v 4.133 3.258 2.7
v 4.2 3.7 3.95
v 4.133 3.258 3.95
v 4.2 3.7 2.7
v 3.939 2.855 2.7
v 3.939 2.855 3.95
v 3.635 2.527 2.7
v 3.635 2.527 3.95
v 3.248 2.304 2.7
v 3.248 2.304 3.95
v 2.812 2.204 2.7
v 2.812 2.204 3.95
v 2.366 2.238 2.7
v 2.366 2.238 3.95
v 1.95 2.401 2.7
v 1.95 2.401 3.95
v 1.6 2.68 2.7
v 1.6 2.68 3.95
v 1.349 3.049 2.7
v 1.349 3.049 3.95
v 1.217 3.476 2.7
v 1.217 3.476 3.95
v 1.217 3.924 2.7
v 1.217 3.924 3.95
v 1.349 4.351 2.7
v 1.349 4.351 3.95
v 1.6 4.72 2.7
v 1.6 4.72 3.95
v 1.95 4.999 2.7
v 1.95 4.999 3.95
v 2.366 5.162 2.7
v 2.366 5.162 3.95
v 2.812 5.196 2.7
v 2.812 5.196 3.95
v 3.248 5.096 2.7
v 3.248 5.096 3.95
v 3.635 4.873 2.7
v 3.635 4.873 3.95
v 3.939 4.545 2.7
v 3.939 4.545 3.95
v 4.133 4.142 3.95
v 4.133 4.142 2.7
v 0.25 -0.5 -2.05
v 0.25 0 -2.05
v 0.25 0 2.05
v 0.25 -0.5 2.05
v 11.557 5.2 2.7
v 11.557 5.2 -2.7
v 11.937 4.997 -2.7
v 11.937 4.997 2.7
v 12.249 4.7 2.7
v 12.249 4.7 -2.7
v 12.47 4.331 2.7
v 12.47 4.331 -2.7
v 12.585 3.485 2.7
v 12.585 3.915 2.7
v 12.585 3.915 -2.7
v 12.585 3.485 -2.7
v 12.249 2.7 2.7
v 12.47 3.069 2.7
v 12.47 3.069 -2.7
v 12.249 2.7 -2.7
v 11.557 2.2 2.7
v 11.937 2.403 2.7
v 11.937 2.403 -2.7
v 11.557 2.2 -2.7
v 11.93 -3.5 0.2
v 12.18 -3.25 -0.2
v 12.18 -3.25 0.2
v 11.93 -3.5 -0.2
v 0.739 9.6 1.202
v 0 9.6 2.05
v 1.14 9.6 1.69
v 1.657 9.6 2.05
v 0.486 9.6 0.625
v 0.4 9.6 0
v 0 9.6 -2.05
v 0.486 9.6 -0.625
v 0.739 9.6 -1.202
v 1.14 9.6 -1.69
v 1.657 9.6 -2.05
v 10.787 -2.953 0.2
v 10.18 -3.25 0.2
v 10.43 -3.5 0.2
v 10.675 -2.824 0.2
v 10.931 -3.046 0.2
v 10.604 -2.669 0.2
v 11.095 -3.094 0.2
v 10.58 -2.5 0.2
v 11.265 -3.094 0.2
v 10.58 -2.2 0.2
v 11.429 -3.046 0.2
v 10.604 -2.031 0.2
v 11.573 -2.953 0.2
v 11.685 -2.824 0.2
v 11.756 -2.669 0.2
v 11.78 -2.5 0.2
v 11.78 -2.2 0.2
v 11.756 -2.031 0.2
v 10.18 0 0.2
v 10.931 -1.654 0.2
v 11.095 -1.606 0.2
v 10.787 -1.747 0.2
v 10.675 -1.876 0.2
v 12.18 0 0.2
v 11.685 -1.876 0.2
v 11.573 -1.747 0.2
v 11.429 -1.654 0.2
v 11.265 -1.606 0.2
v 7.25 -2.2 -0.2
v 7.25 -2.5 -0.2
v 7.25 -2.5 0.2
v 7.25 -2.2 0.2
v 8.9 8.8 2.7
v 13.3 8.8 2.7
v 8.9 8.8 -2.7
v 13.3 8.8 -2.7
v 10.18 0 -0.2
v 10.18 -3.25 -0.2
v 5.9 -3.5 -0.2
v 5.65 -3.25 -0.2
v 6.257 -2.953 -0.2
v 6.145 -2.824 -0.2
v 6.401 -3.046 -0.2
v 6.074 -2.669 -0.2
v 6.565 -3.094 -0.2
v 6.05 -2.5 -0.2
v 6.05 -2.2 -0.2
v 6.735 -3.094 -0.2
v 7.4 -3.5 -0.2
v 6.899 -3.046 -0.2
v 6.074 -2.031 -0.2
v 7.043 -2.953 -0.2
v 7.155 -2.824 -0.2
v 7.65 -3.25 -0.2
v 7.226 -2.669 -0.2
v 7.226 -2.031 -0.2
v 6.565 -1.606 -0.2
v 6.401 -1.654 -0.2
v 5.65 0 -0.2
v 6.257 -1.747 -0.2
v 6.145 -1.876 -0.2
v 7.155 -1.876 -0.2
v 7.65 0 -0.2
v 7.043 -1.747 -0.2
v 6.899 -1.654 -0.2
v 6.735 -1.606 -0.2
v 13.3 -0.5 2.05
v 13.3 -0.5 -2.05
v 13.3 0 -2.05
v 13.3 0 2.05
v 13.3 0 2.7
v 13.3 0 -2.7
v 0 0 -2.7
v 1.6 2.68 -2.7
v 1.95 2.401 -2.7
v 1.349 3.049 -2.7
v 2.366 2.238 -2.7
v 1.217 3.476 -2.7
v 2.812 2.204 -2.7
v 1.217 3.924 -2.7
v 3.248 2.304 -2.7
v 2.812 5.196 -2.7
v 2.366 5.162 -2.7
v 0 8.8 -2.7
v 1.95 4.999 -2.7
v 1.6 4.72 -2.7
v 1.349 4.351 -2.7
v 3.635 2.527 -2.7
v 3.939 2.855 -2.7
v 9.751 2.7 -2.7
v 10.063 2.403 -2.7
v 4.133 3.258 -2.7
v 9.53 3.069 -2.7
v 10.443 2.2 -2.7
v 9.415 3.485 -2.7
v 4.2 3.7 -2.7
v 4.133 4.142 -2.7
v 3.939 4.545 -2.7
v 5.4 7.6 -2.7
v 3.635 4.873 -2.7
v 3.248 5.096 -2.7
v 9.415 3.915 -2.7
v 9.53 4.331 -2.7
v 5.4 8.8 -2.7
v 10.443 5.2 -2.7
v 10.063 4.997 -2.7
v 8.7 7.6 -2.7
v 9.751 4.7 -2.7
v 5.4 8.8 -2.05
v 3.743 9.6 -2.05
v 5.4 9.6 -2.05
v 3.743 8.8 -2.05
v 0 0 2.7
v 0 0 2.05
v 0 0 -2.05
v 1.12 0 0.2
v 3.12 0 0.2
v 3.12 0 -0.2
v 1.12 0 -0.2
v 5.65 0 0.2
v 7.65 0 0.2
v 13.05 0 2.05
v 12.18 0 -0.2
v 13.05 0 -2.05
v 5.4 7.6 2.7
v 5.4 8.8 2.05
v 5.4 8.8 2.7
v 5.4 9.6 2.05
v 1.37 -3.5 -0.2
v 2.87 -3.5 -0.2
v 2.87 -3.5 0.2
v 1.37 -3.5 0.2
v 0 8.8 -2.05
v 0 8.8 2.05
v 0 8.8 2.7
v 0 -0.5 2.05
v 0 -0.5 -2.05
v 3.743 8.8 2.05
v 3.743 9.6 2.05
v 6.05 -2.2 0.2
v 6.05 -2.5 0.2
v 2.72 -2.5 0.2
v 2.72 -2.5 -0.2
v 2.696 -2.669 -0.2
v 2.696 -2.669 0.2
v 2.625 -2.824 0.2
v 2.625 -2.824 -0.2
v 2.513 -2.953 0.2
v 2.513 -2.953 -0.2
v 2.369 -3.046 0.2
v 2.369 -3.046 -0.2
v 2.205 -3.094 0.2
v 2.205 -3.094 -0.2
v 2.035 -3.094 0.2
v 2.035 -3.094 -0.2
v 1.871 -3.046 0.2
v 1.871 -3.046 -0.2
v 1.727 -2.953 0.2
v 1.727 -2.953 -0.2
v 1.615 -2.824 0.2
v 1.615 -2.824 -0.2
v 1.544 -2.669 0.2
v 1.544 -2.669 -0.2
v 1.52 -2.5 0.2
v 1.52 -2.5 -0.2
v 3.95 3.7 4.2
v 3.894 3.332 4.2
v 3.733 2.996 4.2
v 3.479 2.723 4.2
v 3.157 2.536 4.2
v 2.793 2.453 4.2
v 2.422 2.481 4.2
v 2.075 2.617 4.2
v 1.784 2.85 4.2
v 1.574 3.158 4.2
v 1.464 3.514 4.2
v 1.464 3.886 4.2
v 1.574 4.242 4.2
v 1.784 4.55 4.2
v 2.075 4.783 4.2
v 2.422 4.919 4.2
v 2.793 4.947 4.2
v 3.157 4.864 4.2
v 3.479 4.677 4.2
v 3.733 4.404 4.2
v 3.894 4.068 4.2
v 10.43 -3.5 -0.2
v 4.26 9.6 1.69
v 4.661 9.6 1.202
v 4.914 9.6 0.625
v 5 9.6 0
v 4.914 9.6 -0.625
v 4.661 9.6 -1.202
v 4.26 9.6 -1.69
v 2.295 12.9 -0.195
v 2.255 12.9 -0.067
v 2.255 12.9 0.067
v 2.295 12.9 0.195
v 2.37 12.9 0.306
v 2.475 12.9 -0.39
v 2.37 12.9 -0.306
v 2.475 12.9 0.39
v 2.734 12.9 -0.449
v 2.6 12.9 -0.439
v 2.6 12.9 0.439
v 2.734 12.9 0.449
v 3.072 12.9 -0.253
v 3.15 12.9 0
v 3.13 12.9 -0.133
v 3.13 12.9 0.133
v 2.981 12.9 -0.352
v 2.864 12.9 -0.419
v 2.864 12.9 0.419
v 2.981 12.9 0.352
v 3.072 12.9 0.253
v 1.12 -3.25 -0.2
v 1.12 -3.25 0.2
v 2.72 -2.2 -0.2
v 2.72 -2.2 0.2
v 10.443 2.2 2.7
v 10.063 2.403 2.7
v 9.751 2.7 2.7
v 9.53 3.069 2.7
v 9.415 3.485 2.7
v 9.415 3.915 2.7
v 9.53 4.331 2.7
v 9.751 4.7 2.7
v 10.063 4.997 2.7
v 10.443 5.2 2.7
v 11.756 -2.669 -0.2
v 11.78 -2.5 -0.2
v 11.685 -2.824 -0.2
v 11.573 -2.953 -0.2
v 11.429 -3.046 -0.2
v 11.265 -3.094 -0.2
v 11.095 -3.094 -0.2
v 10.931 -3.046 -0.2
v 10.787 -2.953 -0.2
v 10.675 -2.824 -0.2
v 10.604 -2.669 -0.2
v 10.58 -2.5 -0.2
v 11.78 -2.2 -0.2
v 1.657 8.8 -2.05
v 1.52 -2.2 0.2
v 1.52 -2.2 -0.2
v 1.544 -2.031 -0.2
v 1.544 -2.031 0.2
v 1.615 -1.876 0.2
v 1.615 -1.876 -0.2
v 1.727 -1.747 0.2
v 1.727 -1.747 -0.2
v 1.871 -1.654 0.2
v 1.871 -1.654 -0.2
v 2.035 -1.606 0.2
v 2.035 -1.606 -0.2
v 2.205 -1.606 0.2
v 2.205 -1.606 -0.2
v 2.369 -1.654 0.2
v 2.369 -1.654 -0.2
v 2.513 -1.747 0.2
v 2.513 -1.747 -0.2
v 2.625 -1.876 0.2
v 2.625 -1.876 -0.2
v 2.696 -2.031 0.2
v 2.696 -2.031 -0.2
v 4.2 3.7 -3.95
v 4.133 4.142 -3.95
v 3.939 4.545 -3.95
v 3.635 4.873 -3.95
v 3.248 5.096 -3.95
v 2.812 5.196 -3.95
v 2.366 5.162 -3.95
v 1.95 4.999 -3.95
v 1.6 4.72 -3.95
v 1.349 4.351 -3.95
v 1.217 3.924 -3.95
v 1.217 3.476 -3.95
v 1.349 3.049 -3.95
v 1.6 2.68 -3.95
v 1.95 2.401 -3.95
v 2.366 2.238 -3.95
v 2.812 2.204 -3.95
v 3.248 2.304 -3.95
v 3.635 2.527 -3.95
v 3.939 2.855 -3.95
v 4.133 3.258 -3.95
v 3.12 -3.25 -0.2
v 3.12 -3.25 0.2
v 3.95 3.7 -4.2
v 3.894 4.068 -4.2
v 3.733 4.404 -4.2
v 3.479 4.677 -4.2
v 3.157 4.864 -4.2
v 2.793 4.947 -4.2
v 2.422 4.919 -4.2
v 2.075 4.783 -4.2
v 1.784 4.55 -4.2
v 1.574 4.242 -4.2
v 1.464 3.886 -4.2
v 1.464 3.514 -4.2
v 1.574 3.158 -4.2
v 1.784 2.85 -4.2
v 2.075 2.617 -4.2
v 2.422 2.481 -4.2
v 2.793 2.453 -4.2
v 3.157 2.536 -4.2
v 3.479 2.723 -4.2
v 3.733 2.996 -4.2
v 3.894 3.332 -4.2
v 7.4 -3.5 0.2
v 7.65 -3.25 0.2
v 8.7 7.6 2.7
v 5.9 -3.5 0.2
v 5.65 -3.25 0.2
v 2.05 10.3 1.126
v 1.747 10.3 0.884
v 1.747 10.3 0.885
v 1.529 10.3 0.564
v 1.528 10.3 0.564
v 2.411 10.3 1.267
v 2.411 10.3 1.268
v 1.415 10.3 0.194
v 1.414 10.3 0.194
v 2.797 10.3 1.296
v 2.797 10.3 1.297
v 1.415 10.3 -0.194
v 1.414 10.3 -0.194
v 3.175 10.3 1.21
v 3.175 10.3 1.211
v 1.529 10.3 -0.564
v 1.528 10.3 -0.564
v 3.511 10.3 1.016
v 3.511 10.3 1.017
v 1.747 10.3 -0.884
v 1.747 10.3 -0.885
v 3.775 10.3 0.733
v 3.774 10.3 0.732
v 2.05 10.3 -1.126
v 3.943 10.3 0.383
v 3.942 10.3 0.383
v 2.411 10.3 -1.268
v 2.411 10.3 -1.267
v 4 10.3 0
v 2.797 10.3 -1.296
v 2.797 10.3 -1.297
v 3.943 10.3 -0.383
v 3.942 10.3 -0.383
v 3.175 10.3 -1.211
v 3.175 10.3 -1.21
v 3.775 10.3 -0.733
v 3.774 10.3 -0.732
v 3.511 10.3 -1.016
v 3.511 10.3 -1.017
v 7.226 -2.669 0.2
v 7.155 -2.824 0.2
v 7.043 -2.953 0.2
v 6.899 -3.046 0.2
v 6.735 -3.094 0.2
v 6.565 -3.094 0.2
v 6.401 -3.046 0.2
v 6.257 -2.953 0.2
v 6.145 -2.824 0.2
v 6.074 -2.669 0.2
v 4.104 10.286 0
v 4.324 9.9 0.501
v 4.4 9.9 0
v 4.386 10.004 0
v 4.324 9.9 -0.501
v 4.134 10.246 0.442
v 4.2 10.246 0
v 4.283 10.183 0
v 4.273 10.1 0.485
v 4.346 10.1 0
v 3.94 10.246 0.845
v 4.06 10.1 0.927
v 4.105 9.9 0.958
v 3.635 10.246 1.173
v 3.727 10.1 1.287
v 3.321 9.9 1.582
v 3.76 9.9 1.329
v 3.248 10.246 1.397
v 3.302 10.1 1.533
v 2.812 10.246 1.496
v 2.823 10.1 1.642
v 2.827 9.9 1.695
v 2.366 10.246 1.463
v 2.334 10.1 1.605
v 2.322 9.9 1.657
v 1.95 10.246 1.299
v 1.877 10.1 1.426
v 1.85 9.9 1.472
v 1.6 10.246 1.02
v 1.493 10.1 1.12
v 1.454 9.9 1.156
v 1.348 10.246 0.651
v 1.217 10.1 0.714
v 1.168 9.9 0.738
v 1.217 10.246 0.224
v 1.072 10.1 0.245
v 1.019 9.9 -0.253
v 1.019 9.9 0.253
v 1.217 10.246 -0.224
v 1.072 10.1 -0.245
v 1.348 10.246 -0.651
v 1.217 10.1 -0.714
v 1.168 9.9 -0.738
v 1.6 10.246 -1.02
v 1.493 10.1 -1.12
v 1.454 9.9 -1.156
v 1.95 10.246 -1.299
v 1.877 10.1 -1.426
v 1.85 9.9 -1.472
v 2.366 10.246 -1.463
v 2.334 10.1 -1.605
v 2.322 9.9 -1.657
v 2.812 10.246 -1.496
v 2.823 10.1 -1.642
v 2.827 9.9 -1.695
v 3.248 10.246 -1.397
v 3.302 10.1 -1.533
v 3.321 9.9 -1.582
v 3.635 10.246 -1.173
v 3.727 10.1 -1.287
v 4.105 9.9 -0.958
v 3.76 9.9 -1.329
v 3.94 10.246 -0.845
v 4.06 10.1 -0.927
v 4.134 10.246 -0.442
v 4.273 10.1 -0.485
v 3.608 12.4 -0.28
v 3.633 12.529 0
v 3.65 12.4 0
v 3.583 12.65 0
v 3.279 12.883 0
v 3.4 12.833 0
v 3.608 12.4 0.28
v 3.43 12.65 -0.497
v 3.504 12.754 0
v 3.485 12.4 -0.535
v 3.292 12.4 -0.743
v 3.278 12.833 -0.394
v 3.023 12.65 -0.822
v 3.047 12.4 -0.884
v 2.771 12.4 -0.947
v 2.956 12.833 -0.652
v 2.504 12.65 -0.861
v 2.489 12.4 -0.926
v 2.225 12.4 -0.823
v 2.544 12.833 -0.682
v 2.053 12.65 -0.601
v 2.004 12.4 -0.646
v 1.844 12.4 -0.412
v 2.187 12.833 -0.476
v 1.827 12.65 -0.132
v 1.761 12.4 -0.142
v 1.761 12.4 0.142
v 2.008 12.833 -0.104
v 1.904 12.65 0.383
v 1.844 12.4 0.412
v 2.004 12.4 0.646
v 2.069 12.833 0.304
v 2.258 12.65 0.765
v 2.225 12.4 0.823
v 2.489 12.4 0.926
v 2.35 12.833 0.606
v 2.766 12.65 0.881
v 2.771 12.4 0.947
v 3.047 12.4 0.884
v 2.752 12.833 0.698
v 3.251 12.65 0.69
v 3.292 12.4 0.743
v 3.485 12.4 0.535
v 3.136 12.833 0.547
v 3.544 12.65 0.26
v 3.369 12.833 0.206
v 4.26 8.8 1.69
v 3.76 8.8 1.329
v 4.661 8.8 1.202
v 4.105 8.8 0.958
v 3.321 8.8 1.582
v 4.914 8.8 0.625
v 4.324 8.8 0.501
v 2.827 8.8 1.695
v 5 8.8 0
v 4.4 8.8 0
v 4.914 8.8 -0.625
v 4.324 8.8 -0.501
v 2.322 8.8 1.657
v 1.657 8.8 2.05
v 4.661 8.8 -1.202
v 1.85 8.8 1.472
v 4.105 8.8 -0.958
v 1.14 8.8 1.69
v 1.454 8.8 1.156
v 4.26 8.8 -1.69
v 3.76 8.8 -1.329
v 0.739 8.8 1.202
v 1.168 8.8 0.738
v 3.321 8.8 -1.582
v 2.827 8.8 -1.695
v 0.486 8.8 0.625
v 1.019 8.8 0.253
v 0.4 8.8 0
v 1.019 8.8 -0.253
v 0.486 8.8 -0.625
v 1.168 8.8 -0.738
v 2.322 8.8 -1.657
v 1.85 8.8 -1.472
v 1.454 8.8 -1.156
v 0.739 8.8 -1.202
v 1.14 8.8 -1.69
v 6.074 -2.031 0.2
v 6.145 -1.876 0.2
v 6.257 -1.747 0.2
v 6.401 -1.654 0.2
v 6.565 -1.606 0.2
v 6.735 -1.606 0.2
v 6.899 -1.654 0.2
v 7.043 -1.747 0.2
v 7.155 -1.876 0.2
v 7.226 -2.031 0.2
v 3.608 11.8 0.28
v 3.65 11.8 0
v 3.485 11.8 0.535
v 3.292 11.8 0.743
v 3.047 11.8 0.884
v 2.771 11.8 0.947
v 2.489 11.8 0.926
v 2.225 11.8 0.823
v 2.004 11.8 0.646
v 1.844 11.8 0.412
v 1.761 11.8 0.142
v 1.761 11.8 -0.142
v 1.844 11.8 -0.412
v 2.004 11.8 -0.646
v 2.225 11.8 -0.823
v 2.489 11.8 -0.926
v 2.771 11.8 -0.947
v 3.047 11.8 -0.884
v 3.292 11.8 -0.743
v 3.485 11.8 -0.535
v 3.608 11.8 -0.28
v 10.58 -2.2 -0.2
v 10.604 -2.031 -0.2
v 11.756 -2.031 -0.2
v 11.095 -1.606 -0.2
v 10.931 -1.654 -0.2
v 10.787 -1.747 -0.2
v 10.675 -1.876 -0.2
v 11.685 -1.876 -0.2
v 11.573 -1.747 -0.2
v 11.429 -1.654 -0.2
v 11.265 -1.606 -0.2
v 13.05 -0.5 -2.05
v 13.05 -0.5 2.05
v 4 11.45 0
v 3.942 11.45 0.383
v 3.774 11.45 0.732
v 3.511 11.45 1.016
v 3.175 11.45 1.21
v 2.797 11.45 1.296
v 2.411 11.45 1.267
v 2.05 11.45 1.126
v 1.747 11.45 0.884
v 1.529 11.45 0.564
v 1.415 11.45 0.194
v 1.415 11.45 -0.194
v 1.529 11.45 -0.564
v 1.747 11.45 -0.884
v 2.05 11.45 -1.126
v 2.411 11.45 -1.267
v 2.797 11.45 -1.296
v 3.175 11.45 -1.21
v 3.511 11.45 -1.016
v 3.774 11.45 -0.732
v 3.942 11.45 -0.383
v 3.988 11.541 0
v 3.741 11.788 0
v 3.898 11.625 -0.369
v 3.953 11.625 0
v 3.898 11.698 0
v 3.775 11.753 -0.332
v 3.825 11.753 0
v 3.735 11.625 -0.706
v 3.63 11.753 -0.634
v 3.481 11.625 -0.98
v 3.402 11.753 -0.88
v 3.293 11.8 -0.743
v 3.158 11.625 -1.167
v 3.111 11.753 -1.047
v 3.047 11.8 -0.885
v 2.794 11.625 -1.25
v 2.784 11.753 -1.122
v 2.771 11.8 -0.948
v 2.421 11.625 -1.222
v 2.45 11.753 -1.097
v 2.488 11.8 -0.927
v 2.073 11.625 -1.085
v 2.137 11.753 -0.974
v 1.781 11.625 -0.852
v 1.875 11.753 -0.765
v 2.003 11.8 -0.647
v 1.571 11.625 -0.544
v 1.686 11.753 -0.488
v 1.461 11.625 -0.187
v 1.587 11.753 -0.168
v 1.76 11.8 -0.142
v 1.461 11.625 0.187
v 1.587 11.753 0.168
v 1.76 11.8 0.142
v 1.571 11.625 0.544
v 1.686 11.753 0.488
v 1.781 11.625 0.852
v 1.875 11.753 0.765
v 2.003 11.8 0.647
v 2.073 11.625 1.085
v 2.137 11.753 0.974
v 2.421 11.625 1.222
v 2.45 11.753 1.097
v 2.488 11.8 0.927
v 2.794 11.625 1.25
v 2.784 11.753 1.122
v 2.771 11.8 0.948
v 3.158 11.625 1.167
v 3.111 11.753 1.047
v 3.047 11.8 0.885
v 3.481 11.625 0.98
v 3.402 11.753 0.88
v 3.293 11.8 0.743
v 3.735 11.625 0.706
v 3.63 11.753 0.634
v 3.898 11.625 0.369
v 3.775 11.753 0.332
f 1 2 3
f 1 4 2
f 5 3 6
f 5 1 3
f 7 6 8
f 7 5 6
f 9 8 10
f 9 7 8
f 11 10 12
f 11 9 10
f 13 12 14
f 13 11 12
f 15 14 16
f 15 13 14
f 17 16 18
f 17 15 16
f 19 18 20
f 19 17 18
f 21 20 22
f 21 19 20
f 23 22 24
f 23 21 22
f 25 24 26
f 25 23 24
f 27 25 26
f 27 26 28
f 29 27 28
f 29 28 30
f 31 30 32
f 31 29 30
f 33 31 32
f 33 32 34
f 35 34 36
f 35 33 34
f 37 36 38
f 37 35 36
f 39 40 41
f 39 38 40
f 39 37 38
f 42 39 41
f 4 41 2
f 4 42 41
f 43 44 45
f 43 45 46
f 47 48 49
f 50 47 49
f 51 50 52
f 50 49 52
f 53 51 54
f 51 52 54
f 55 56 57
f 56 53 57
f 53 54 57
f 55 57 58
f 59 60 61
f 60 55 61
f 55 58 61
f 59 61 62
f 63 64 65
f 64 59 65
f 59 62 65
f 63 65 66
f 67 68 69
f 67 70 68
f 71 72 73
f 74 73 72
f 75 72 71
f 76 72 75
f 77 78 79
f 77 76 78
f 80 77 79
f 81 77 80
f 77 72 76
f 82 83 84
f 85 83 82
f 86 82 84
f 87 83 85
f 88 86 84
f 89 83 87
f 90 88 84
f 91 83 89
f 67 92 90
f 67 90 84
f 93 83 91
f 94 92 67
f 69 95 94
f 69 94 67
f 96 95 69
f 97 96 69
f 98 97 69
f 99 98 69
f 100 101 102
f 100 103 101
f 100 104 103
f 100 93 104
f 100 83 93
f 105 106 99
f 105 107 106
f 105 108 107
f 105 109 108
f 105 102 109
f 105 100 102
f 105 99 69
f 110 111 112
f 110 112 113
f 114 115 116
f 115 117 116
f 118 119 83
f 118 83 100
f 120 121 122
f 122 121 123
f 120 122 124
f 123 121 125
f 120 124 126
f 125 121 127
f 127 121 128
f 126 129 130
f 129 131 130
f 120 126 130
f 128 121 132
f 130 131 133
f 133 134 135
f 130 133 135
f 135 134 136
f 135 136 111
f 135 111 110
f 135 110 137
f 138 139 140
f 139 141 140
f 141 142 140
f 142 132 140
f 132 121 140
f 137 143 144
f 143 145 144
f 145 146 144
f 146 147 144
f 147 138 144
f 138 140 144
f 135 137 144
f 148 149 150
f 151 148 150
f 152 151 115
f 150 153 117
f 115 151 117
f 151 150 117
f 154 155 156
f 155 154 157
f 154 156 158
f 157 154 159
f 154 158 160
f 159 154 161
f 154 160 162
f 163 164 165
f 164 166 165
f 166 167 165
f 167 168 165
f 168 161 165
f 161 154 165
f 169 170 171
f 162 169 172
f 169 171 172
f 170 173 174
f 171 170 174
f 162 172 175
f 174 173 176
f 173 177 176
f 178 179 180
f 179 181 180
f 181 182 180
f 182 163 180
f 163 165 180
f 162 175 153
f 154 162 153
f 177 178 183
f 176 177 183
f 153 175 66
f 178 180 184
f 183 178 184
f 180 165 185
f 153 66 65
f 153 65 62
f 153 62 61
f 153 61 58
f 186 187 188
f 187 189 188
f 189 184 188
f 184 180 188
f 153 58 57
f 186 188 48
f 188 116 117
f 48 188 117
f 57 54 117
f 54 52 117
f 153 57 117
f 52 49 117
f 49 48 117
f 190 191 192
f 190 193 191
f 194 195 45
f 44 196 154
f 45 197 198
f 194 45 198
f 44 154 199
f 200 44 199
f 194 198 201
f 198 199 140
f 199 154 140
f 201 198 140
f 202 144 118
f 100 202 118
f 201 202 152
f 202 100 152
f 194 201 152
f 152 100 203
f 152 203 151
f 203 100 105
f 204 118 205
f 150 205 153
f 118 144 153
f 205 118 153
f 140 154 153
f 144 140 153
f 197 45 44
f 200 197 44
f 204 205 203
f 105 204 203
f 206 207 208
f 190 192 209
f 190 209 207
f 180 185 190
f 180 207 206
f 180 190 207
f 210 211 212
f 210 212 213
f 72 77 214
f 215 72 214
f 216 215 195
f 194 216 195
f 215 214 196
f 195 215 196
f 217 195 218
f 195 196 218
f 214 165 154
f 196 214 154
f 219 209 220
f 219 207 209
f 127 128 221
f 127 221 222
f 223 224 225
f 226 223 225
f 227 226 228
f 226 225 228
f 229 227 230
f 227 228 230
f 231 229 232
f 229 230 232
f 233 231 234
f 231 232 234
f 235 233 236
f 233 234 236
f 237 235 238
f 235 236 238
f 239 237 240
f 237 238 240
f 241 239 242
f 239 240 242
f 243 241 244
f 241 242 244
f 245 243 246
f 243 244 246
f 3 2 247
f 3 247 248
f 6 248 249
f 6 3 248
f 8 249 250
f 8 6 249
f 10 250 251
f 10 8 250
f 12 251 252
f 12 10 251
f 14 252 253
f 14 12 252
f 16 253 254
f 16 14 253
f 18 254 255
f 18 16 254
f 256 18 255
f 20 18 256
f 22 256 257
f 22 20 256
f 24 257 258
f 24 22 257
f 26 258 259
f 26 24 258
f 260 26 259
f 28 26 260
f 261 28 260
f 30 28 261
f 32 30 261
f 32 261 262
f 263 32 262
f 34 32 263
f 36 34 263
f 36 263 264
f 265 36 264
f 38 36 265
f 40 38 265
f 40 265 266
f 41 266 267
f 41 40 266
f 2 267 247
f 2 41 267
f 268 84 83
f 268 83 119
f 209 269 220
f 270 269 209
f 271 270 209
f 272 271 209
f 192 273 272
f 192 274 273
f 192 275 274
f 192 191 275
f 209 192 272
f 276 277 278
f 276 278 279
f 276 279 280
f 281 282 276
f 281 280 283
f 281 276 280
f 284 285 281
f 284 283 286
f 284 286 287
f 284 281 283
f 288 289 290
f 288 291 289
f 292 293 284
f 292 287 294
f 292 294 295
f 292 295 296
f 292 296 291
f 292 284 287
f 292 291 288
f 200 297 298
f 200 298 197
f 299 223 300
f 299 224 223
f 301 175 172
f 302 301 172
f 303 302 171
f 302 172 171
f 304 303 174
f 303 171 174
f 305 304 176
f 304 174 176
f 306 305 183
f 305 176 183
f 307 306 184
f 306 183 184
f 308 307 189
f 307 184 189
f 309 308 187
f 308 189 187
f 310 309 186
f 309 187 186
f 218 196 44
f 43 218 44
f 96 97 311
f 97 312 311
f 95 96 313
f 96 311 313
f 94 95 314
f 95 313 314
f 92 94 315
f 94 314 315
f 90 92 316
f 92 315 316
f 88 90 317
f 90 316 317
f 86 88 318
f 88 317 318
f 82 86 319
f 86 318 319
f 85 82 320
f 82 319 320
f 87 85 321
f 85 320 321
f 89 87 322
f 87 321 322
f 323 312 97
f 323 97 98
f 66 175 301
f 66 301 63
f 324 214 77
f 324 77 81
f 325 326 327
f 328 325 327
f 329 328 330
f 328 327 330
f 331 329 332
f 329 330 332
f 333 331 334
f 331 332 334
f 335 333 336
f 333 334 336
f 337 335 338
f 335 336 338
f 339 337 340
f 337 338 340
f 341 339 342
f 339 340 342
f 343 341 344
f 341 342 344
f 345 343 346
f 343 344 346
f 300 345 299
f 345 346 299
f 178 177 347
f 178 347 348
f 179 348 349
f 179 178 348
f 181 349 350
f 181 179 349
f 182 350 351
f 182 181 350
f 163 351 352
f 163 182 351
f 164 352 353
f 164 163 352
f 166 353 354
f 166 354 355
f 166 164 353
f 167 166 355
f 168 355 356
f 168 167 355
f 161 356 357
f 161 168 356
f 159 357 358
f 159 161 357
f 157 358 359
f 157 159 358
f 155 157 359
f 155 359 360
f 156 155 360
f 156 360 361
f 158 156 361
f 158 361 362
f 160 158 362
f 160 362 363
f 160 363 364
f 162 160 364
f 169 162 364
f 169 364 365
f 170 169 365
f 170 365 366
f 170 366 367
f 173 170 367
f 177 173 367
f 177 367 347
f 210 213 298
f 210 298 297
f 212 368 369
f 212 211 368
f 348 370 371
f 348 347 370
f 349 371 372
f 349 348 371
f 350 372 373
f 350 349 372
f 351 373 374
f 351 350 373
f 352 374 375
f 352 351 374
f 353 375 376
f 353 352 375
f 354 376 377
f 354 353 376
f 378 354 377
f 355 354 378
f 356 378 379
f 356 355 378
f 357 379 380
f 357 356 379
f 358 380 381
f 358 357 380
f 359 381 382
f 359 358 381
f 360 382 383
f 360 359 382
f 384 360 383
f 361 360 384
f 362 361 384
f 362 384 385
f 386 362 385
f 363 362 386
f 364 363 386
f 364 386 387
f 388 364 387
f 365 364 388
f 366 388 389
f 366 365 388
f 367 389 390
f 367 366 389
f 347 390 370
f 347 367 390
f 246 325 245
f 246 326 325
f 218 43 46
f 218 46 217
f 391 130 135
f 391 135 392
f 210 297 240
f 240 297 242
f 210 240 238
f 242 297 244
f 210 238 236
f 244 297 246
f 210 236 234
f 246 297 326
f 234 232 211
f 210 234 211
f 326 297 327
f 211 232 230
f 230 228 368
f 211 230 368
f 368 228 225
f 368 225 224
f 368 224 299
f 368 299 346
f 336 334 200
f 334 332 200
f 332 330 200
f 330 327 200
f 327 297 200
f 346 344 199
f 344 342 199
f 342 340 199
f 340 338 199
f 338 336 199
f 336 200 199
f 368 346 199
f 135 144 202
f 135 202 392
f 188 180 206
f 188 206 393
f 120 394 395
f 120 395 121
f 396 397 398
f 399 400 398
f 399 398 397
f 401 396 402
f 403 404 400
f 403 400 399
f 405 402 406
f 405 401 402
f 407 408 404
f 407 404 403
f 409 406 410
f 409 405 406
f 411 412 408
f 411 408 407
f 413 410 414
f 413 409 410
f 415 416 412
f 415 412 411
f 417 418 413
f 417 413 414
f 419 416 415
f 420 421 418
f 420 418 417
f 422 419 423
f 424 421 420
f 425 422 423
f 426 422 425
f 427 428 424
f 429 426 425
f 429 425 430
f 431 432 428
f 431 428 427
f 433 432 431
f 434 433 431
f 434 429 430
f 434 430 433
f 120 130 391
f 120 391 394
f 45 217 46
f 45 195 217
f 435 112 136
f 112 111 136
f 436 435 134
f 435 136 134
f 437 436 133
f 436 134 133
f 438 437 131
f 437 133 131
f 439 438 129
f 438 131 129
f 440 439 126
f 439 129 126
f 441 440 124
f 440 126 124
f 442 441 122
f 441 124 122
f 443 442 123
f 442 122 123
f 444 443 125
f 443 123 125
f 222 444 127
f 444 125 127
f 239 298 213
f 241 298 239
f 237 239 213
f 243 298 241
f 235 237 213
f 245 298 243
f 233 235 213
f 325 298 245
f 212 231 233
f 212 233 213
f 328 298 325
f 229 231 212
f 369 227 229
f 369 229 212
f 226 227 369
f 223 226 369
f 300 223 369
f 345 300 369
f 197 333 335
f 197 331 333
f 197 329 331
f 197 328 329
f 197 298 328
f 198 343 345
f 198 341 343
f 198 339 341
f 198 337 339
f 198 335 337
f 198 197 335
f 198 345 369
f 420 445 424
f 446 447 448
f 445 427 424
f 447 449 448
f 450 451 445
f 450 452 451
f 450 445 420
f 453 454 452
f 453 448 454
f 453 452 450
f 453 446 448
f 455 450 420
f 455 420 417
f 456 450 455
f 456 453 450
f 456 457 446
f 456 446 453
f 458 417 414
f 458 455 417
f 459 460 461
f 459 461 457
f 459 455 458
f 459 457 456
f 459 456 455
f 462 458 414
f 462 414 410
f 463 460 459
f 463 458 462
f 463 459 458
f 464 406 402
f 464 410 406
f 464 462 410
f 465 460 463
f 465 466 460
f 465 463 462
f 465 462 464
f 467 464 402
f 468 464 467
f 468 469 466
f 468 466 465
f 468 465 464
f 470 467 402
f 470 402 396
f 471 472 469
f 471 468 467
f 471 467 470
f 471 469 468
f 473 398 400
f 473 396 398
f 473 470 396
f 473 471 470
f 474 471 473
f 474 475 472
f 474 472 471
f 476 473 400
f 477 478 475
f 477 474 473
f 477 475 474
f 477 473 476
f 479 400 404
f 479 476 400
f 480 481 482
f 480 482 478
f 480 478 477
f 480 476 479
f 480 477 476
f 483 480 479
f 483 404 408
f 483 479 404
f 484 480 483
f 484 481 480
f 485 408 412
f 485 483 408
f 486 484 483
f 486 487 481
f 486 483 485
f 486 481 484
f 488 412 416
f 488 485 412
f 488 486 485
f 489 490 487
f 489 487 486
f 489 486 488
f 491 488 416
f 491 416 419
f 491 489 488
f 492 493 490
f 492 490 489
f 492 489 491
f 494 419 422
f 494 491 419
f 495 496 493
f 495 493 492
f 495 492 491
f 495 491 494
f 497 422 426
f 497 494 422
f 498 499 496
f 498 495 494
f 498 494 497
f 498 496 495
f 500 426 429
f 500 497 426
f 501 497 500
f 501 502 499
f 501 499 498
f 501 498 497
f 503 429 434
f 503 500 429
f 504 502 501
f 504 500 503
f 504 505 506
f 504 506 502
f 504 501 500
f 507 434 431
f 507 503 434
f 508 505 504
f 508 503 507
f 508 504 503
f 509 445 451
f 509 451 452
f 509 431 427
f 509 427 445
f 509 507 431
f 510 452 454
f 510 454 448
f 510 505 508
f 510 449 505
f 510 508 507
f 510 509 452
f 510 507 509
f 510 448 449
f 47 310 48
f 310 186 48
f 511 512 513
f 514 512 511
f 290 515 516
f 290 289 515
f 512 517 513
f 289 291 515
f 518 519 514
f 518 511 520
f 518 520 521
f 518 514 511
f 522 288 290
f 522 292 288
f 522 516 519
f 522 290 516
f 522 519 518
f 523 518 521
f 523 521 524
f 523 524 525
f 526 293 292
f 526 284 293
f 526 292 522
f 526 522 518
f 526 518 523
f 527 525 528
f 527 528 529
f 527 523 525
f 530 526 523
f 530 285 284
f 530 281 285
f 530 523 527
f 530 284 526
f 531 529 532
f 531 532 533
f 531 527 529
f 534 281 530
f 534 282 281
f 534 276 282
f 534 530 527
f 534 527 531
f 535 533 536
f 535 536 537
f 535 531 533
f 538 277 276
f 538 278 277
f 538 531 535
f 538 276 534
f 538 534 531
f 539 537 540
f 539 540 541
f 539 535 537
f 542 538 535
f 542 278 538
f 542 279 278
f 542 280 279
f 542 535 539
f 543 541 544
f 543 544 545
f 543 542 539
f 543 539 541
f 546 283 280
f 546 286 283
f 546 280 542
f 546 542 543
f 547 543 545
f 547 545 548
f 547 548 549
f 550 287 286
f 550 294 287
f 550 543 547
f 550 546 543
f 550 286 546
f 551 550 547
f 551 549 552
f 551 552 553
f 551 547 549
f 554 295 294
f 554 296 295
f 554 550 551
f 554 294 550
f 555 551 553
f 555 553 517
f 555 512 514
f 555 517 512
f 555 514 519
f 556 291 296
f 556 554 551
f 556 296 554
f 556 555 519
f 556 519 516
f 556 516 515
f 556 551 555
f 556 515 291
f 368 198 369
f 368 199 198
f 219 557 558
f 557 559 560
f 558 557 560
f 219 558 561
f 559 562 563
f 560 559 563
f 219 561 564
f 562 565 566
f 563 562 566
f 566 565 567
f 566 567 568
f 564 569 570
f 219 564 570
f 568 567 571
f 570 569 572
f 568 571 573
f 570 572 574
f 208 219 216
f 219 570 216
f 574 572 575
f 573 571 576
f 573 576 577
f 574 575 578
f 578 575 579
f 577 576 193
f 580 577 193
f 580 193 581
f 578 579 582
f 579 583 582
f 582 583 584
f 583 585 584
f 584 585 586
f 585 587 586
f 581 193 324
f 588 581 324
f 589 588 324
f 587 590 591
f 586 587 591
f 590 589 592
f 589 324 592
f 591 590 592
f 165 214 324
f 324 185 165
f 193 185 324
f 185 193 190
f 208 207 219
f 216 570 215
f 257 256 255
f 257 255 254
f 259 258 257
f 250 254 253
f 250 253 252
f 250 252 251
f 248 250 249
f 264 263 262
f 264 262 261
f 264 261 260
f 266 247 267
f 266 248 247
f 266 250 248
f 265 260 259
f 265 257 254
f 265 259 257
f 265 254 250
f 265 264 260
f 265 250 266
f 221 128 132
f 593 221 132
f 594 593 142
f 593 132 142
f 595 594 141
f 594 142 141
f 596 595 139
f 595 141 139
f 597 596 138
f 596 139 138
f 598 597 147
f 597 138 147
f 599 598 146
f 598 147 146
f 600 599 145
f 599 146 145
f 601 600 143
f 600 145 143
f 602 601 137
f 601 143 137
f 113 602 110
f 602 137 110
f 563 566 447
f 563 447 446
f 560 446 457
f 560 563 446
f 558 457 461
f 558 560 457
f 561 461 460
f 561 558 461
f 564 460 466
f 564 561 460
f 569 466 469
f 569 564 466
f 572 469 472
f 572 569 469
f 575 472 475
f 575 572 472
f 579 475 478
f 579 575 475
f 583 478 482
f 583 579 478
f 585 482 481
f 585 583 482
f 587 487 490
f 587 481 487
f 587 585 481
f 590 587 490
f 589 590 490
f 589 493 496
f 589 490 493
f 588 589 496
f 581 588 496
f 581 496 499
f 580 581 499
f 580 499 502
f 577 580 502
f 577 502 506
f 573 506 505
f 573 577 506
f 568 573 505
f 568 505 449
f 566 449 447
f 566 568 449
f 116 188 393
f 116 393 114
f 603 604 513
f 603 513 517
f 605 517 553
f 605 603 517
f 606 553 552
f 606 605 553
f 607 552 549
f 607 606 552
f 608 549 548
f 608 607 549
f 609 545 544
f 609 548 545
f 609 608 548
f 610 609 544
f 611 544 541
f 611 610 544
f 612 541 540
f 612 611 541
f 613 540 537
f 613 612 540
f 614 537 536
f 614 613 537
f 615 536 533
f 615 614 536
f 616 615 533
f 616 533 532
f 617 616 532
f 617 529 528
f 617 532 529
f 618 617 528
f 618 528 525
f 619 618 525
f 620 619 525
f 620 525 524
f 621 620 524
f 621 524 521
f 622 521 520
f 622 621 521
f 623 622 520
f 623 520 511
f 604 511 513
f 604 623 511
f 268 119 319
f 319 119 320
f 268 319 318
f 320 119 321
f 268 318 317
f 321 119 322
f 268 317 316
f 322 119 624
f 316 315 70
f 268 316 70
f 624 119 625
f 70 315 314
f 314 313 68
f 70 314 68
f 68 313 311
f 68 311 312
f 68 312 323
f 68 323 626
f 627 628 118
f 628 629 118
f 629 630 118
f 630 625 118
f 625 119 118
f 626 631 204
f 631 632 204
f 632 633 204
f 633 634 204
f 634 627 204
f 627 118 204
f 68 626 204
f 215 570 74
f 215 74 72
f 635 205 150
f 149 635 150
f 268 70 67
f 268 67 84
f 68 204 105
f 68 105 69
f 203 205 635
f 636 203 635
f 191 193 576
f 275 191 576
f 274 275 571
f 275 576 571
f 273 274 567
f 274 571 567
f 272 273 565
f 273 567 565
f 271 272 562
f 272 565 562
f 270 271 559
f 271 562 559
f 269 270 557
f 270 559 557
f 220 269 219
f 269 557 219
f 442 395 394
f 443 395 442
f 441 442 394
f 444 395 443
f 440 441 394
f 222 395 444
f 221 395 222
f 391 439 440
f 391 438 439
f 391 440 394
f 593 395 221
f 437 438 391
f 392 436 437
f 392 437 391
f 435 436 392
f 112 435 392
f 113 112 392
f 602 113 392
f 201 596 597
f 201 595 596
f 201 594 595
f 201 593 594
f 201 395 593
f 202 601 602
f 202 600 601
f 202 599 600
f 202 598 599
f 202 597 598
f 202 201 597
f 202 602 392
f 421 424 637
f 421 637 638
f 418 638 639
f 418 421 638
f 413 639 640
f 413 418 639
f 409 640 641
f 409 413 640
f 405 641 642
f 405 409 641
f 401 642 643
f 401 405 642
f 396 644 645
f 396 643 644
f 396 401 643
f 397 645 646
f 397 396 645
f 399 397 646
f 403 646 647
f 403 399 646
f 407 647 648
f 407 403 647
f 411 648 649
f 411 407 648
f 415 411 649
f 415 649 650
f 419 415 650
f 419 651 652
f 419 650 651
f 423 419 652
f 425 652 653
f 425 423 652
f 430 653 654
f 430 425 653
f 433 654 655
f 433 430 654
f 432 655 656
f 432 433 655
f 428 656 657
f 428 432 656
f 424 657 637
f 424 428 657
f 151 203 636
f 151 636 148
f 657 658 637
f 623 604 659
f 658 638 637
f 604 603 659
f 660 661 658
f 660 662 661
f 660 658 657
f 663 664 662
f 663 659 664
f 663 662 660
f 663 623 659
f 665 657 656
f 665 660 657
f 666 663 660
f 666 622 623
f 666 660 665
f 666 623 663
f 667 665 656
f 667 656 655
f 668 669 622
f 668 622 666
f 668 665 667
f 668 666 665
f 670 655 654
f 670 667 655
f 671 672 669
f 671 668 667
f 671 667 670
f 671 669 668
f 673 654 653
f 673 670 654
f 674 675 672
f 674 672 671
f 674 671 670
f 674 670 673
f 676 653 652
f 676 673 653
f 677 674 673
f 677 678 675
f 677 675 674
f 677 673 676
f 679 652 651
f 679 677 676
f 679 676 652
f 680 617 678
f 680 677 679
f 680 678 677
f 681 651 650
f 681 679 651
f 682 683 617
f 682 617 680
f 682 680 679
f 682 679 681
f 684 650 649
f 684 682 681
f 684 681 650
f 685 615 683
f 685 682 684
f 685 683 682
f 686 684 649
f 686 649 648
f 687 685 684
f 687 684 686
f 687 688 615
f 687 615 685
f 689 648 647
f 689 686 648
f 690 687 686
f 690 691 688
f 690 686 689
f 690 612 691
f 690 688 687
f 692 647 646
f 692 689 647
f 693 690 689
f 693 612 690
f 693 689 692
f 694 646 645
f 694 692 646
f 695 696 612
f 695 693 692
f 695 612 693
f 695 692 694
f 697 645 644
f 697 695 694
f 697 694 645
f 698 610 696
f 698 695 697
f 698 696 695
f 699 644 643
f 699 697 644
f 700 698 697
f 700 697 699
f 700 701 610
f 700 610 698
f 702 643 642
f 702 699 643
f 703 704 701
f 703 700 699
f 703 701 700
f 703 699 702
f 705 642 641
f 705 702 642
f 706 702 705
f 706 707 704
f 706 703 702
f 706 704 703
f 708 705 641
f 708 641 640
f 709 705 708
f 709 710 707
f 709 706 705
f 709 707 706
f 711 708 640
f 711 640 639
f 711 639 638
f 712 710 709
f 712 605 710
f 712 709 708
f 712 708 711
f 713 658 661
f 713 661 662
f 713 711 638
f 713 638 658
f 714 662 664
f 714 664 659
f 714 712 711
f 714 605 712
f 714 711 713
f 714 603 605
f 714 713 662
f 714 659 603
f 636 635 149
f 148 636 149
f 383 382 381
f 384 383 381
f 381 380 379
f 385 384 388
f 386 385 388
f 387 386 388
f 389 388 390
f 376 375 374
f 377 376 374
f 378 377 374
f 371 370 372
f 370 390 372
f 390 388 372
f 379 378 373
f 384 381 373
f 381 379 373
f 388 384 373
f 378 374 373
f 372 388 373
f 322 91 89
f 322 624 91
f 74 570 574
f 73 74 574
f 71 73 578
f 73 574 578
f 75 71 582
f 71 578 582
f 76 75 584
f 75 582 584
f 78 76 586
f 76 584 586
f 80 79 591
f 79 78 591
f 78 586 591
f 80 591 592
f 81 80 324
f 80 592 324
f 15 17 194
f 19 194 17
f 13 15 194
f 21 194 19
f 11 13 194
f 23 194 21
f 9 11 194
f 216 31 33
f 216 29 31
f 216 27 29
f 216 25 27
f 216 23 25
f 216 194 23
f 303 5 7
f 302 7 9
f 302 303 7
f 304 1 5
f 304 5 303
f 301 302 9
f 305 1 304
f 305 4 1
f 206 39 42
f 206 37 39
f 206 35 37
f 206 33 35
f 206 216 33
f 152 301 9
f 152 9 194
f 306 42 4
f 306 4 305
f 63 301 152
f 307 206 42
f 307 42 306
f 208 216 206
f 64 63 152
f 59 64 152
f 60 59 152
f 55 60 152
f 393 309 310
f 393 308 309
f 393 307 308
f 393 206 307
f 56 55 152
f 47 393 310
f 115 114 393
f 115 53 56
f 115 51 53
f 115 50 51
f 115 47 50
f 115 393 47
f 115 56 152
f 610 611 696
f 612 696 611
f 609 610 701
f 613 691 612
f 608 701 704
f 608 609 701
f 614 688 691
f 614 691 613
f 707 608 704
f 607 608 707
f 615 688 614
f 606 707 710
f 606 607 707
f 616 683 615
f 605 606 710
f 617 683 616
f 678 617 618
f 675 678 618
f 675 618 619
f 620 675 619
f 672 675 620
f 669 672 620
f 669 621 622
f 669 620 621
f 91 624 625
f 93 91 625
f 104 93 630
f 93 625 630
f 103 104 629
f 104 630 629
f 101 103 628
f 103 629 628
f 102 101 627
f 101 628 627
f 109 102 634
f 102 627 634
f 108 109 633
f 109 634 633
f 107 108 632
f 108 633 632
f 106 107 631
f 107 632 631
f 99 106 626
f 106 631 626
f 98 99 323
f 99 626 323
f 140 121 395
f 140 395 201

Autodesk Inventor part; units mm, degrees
ref_plane "YZ Plane" through (0, 0, 0) normal (1, 0, 0) x (0, 1, 0)
ref_plane "XZ Plane" through (0, 0, 0) normal (0, 1, 0) x (-1, 0, 0)
ref_plane "XY Plane" through (0, 0, 0) normal (0, 0, 1) x (1, 0, 0)
sketch "Skizze1" plane through (0, 0, 0) normal (0, 0, 1) x (1, 0, 0)
  line L0 (0, 0) -> (13.3, 0)
  line L1 (13.3, 0) -> (13.3, 8.8)
  line L2 (13.3, 8.8) -> (0, 8.8)
  line L3 (0, 8.8) -> (0, 0)
  circle A0 centre (2.7, 3.7) radius 1.5
  line L4 (0, 3.7) -> (13.3, 3.7) construction
  line L5 (10.4432, 5.2) -> (11.5568, 5.2)
  line L6 (10.4432, 2.2) -> (11.5568, 2.2)
  arc A1 (10.4432, 5.2) -> (10.4432, 2.2) centre (11, 3.7) ccw
  arc A2 (11.5568, 2.2) -> (11.5568, 5.2) centre (11, 3.7) ccw
  circle A3 centre (11, 3.7) radius 1.6 construction
  line L7 (1.12, 0) -> (3.12, 0)
  line L8 (3.12, 0) -> (3.12, -3.5)
  line L9 (3.12, -3.5) -> (1.12, -3.5)
  line L10 (1.12, -3.5) -> (1.12, 0)
  line L11 (5.65, 0) -> (7.65, 0)
  line L12 (7.65, 0) -> (7.65, -3.5)
  line L13 (7.65, -3.5) -> (5.65, -3.5)
  line L14 (5.65, -3.5) -> (5.65, 0)
  line L15 (10.18, 0) -> (12.18, 0)
  line L16 (12.18, 0) -> (12.18, -3.5)
  line L17 (12.18, -3.5) -> (10.18, -3.5)
  line L18 (10.18, -3.5) -> (10.18, 0)
  line L19 (0, 0) -> (0.25, 0)
  line L20 (0.25, 0) -> (0.25, -0.5)
  line L21 (0.25, -0.5) -> (0, -0.5)
  line L22 (0, -0.5) -> (0, 0)
  line L23 (13.3, 0) -> (13.05, 0)
  line L24 (13.05, 0) -> (13.05, -0.5)
  line L25 (13.05, -0.5) -> (13.3, -0.5)
  line L26 (13.3, -0.5) -> (13.3, 0)
  line L27 (2.12, 0) -> (2.12, -3.5) construction
  line L28 (6.65, 0) -> (6.65, -3.5) construction
  line L29 (11.18, 0) -> (11.18, -3.5) construction
  line L30 (11.18, -1.6) -> (11.18, -3.1) construction
  line L31 (10.58, -2.2) -> (10.58, -2.5)
  line L32 (11.78, -2.5) -> (11.78, -2.2)
  arc A4 (11.78, -2.2) -> (10.58, -2.2) centre (11.18, -2.2) ccw
  arc A5 (10.58, -2.5) -> (11.78, -2.5) centre (11.18, -2.5) ccw
  line L33 (2.12, -1.6) -> (2.12, -3.1) construction
  line L34 (1.52, -2.2) -> (1.52, -2.5)
  line L35 (2.72, -2.5) -> (2.72, -2.2)
  arc A6 (2.72, -2.2) -> (1.52, -2.2) centre (2.12, -2.2) ccw
  arc A7 (1.52, -2.5) -> (2.72, -2.5) centre (2.12, -2.5) ccw
  line L36 (6.65, -1.6) -> (6.65, -3.1) construction
  line L37 (6.05, -2.2) -> (6.05, -2.5)
  line L38 (7.25, -2.5) -> (7.25, -2.2)
  arc A8 (7.25, -2.2) -> (6.05, -2.2) centre (6.65, -2.2) ccw
  arc A9 (6.05, -2.5) -> (7.25, -2.5) centre (6.65, -2.5) ccw
  line L39 (5.4, 8.8) -> (5.4, 7.6)
  line L40 (5.4, 7.6) -> (8.7, 7.6)
  line L41 (8.7, 7.6) -> (8.9, 8.8)
  point P0 (13.175, -0.5)
  point P1 (11.18, -2.35)
  point P2 (2.12, -2.35)
  point P3 (6.65, -2.35)
  dimension "d0" = 13.3
  dimension "d3" = 3
  dimension "d4" = 3.7
  dimension "d5" = 5.1
  dimension "d6" = 3
  dimension "d7" = 2.7
  dimension "d8" = 8.3
  dimension "d10" = 3.2
  dimension "d11" = 4.2
  dimension "d12" = 0.25
  dimension "d13" = 0.25
  dimension "d14" = 4.53
  dimension "d15" = 4.53
  dimension "d16" = 2
  dimension "d17" = 3
  dimension "d18" = 1.5
  dimension "d19" = 1.2
  dimension "d23" = 1.5
  dimension "d24" = 1.2
  dimension "d25" = 0.4
  dimension "d26" = 0.4
  dimension "d27" = 1.5
  dimension "d28" = 1.2
  dimension "d29" = 0.4
  dimension "d30" = 5.4
  dimension "d32" = 3.3
  dimension "d33" = 1.2
  dimension "d34" = 3.5
extrude "Extrusion1" add sketch "Skizze1" along normal mid plane 5.4 contours L3 L2 L39 L40 L41 L1 L0
extrude "Extrusion2" add sketch "Skizze1" along normal mid plane 8.4 contours A0
extrude "Extrusion3" add sketch "Skizze1" along normal mid plane 0.4 contours L0 L8 L9 L10 | L0 L12 L13 L14 | L0 L16 L17 L18
extrude "Extrusion4" add sketch "Skizze1" along normal mid plane 4.1 contours L0 L20 L21 L22 | L26 L25 L24 L0
chamfer "Fase1" distance 0.25 angle 45 2 edges at (1.2, 3.7, 4.2) (1.2, 3.7, -4.2)
chamfer "Fase2" distance 0.25 angle 45 6 edges at (12.18, -3.5, 0) (10.18, -3.5, 0) (7.65, -3.5, 0) (5.65, -3.5, 0) (3.12, -3.5, 0) (1.12, -3.5, 0)
sketch "Skizze2" plane through (0, 8.8, 2.7) normal (0, 1, 0) x (1, 0, 0)
  line L0 (0, 5.4) -> (0, 0) projected
  line L1 (5.4, 0) -> (0, 0) projected
  line L2 (5.4, 5.4) -> (5.4, 0) projected
  line L3 (0, 5.4) -> (5.4, 5.4) projected
  circle A0 centre (2.7, 2.7) radius 2.7 construction
  circle A1 centre (2.7, 2.7) radius 1.7
  circle A2 centre (2.7, 2.7) radius 1.3
  circle A3 centre (2.7, 2.7) radius 0.95
  line L4 (5.4, 5.4) -> (5.4, 0) projected
  line L5 (0, 4.75) -> (5.4, 4.75)
  line L6 (5.4, 4.75) -> (5.4, 0.65)
  line L7 (5.4, 0.65) -> (0, 0.65)
  line L8 (0, 0.65) -> (0, 4.75)
  line L9 (0, 4.75) -> (5.4, 0.65) construction
  line L10 (5.4, 4.75) -> (0, 0.65) construction
  circle A4 centre (2.7, 2.7) radius 2.3
  point P0 (0, 2.7)
  point P1 (3.7428, 4.75)
  point P2 (3.7428, 0.65)
  point P3 (5.4, 0.65)
  point P4 (1.6572, 0.65)
  point P5 (1.6572, 4.75)
  dimension "d49" = 1.9
  dimension "d50" = 2.6
  dimension "d51" = 3.4
  dimension "d61" = 4.1
  dimension "d62" = 4.6
extrude "Extrusion5" add sketch "Skizze2" along normal blind 4.1 contours A3
extrude "Extrusion6" add sketch "Skizze2" along normal blind 3 contours A2
extrude "Extrusion7" add sketch "Skizze2" along normal blind 1.5 contours A1
fillet "Rundung1" radius 0.5 1 edges at (1.75, 12.9, 0)
fillet "Rundung2" radius 0.4 1 edges at (1, 10.3, 0)
fillet "Rundung3" radius 0.35 1 edges at (1.4, 11.8, 0)
extrude "Extrusion8" add sketch "Skizze2" along normal blind 0.8 contours L5 A4 L7 L0 | L2 L7 A4 L5
properties part number "Microswitch Panasonic" material "PVC, hart"
